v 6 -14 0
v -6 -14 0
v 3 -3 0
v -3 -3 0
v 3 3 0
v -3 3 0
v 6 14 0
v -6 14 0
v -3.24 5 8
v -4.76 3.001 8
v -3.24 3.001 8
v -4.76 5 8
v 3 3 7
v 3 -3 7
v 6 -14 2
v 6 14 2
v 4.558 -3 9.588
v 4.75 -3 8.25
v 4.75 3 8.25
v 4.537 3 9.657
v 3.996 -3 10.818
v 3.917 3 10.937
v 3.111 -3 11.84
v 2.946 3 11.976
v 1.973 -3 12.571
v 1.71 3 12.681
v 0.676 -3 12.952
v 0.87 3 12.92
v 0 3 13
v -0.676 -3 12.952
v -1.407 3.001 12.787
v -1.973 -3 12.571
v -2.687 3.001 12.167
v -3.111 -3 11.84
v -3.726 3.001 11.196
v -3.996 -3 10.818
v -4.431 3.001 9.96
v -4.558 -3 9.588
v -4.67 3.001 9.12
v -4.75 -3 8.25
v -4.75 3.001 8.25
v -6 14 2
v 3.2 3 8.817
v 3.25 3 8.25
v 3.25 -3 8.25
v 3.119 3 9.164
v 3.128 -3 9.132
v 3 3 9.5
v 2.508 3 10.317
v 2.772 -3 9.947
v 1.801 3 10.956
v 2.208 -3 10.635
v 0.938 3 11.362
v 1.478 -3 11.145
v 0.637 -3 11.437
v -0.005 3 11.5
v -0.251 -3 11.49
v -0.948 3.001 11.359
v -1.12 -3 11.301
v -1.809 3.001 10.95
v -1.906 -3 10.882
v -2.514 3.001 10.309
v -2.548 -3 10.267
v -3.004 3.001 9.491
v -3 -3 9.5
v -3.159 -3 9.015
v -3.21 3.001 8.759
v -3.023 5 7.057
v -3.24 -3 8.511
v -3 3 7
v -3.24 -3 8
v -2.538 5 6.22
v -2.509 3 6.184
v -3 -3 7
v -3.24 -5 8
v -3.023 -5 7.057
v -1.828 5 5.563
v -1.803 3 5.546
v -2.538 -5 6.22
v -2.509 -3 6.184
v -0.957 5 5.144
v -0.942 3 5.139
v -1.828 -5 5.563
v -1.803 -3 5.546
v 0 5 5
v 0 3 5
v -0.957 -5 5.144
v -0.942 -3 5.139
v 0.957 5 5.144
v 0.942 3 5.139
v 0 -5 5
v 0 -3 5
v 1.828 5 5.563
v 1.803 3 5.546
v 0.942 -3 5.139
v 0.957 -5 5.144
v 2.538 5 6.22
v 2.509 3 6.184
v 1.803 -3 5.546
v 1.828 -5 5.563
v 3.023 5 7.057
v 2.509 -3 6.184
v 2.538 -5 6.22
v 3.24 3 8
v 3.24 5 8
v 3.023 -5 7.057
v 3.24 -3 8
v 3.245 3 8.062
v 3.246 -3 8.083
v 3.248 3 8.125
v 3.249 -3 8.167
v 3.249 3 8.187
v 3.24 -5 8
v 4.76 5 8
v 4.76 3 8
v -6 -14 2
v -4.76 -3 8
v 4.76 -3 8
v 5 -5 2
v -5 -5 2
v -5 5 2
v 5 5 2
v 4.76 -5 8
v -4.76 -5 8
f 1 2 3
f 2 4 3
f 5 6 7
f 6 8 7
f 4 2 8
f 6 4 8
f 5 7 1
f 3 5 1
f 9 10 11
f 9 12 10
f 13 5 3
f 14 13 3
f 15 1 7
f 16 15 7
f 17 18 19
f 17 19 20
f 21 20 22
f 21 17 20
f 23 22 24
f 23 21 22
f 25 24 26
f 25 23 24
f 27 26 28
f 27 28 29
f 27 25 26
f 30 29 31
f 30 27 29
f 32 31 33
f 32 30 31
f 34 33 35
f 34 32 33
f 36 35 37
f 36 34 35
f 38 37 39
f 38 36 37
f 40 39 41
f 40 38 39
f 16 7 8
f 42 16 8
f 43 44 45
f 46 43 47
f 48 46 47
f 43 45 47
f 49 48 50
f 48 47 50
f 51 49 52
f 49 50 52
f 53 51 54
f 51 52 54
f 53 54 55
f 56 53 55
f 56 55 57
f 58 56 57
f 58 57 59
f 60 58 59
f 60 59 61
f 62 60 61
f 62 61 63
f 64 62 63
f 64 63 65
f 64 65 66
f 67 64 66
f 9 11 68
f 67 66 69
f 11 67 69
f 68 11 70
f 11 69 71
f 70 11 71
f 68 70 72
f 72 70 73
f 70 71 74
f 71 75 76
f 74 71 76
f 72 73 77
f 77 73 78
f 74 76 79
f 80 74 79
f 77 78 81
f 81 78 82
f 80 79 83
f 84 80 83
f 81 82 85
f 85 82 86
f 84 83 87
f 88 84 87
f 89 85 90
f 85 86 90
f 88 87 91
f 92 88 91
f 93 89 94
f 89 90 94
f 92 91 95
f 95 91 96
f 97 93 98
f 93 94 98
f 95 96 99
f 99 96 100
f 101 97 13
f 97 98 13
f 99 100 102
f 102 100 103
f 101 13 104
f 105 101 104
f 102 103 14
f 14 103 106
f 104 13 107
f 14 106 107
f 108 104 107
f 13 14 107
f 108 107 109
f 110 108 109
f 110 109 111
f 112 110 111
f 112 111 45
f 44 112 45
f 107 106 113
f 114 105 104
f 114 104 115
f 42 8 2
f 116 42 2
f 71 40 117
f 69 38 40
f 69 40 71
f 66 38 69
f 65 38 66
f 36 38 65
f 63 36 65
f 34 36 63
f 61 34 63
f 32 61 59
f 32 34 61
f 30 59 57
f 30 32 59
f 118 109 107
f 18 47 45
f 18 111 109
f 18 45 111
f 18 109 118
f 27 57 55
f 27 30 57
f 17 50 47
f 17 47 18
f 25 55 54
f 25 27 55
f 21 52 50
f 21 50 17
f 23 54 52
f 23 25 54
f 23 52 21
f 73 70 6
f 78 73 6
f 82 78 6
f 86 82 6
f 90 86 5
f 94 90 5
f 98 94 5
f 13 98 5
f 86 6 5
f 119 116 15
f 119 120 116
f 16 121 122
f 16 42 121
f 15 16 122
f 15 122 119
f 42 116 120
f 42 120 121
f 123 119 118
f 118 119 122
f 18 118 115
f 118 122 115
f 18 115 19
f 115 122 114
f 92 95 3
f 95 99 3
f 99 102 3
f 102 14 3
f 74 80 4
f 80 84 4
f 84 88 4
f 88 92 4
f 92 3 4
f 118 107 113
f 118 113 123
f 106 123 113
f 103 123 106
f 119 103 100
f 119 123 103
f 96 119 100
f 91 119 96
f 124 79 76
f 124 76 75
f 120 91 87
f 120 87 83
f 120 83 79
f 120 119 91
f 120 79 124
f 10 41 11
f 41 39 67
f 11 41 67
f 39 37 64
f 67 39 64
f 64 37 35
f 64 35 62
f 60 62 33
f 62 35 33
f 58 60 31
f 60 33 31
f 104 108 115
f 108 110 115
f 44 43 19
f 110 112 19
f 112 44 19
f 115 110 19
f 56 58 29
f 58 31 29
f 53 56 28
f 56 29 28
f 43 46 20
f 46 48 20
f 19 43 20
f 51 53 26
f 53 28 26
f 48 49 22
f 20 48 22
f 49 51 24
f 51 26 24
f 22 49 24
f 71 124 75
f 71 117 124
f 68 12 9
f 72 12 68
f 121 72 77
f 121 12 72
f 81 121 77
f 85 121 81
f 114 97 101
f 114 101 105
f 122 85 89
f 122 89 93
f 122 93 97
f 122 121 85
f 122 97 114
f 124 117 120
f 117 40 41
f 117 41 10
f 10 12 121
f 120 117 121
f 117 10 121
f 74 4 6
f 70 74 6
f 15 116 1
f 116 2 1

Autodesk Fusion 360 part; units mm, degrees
sketch "Sketch1" plane through (0, 0, 0) normal (0, 0, 1) x (1, 0, 0)
sketch "Sketch2" plane through (0, 0, 0) normal (0, 0, 1) x (1, 0, 0)
  line L0 (6, 14) -> (-6, 14)
  line L1 (-6, 14) -> (-6, -14)
  line L2 (-6, -14) -> (6, -14)
  line L3 (6, -14) -> (6, 14)
  line L4 (6, 14) -> (-6, -14) construction
  line L5 (-6, 14) -> (6, -14) construction
  line L6 (-3, 3) -> (3, 3)
  line L7 (3, 3) -> (3, -3)
  line L8 (3, -3) -> (-3, -3)
  line L9 (-3, -3) -> (-3, 3)
  line L10 (-3, 3) -> (3, -3) construction
  line L11 (3, 3) -> (-3, -3) construction
  line L12 (5, -5) -> (-5, -5)
  line L13 (-5, -5) -> (-5, 5)
  line L14 (-5, 5) -> (5, 5)
  line L15 (5, 5) -> (5, -5)
  dimension "d10" = 12
  dimension "d11" = 28
  dimension "d12" = 6
  dimension "d13" = 6
  dimension "d14" = -2
extrude "Extrude3" add sketch "Sketch2" along normal blind 2 contours L0 L1 L2 L3 | L6 L7 L8 L9 | L12 L13 L14 L15
extrude "Extrude4" add sketch "Sketch2" along normal blind 13 contours L6 L7 L8 L9 | L12 L13 L14 L15
extrude "Extrude5" cut sketch "Sketch2" along normal blind 9.5 contours L6 L7 L8 L9
sketch "Sketch3" plane through (0, -5, 0) normal (0, -1, 0) x (1, 0, 0)
  line L0 (-5, 2) -> (5, 2)
  line L1 (5, 2) -> (5, 13)
  line L2 (5, 13) -> (-5, 13)
  line L3 (-5, 13) -> (-5, 2)
  line L4 (0, 13) -> (0, 11.5)
  line L5 (0, 11.5) -> (0, 5)
  line L6 (0, 5) -> (0, 2)
  line L7 (0, 11.5) -> (0, 8.25)
  circle A0 centre (0, 8.25) radius 3.25
  circle A1 centre (0, 8.25) radius 4.75
  line L8 (0, 8.25) -> (5, 8.25)
  line L9 (5, 8.25) -> (-5, 8.25)
  dimension "d21" = 1.5
  dimension "d22" = 6.5
  dimension "d23" = 3.25
  dimension "d24" = 6.5
  dimension "d25" = 1.5
extrude "Extrude6" cut sketch "Sketch3" against normal blind 12 contours L5 A0 L9 | L5 A0 L8 L9 | L5 L7 A0 L9 | L5 L7 A0 L8 L9
extrude "Extrude7" cut sketch "Sketch3" against normal blind 10 contours L2 L3 A1 L9 | L1 L2 A1 L8 L9
sketch "Sketch4" plane through (0, 5, 0) normal (0, 1, 0) x (-1, 0, 0)
  line L0 (-4.75, 8.25) -> (-5, 8.25)
  line L1 (-5, 8.25) -> (-5, 2)
  line L2 (-5, 2) -> (5, 2)
  line L3 (5, 2) -> (5, 8.25)
  line L4 (5, 8.25) -> (4.75, 8.25)
  arc A0 (4.75, 8.25) -> (-4.75, 8.25) centre (0, 8.25) ccw
  circle A1 centre (0, 8.25) radius 3.25
  line L5 (4.75, 8.25) -> (5, 2)
  line L6 (-5, 2) -> (-4.75, 8.25)
extrude "Extrude8" cut sketch "Sketch4" against normal blind 10 contours L0 L1 L6 | L3 L4 L5
sketch "Sketch5" plane through (0, 0, 0) normal (0, 0, 1) x (1, 0, 0)
  line L0 (3, 3) -> (-3, 3)
  line L1 (-3, 3) -> (-3, -3)
  line L2 (-3, -3) -> (3, -3)
  line L3 (3, -3) -> (3, 3)
  line L4 (3, 3) -> (-3, -3) construction
  line L5 (-3, 3) -> (3, -3) construction
  dimension "d32" = 6
  dimension "d33" = 6
ref_plane "WorkPlane1" through (0, 0, 13) normal (0, 0, 1) x (1, 0, 0)
sketch "Sketch6" plane through (0, 0, 13) normal (0, 0, 1) x (1, 0, 0)
  line L0 (5, 3) -> (-5, 3)
  line L1 (-5, 3) -> (-5, -3)
  line L2 (-5, -3) -> (5, -3)
  line L3 (5, -3) -> (5, 3)
  line L4 (5, 3) -> (-5, -3) construction
  line L5 (-5, 3) -> (5, -3) construction
  dimension "d35" = 10
  dimension "d36" = 6
sketch "Sketch7" plane through (0, 0, 13) normal (0, 0, 1) x (1, 0, 0)
  line L0 (-5, 5) -> (5, 5)
  line L1 (5, 5) -> (5, -5)
  line L2 (5, -5) -> (-5, -5)
  line L3 (-5, -5) -> (-5, 5)
  line L4 (-5, 5) -> (5, -5) construction
  line L5 (5, 5) -> (-5, -5) construction
  line L6 (5, -5) -> (-5, -5)
  line L7 (-5, -5) -> (-5, -3)
  line L8 (-5, -3) -> (5, -3)
  line L9 (5, -3) -> (5, -5)
  line L10 (5, 5) -> (5, 5)
  line L11 (5, 5) -> (5, 3)
  line L12 (5, 3) -> (5, 3)
  line L13 (5, 3) -> (5, 5)
  line L14 (-5, 3.0009) -> (5, 3.0009)
  line L15 (5, 3.0009) -> (5, 5)
  line L16 (5, 5) -> (-5, 5)
  line L17 (-5, 5) -> (-5, 3.0009)
  dimension "d37" = 10
extrude "Extrude9" cut sketch "Sketch7" against normal blind 5 contours L0 L1 L3 L11 L13 L14 L15 L16 L17 | L1 L2 L3 L6 L7 L8 L9
